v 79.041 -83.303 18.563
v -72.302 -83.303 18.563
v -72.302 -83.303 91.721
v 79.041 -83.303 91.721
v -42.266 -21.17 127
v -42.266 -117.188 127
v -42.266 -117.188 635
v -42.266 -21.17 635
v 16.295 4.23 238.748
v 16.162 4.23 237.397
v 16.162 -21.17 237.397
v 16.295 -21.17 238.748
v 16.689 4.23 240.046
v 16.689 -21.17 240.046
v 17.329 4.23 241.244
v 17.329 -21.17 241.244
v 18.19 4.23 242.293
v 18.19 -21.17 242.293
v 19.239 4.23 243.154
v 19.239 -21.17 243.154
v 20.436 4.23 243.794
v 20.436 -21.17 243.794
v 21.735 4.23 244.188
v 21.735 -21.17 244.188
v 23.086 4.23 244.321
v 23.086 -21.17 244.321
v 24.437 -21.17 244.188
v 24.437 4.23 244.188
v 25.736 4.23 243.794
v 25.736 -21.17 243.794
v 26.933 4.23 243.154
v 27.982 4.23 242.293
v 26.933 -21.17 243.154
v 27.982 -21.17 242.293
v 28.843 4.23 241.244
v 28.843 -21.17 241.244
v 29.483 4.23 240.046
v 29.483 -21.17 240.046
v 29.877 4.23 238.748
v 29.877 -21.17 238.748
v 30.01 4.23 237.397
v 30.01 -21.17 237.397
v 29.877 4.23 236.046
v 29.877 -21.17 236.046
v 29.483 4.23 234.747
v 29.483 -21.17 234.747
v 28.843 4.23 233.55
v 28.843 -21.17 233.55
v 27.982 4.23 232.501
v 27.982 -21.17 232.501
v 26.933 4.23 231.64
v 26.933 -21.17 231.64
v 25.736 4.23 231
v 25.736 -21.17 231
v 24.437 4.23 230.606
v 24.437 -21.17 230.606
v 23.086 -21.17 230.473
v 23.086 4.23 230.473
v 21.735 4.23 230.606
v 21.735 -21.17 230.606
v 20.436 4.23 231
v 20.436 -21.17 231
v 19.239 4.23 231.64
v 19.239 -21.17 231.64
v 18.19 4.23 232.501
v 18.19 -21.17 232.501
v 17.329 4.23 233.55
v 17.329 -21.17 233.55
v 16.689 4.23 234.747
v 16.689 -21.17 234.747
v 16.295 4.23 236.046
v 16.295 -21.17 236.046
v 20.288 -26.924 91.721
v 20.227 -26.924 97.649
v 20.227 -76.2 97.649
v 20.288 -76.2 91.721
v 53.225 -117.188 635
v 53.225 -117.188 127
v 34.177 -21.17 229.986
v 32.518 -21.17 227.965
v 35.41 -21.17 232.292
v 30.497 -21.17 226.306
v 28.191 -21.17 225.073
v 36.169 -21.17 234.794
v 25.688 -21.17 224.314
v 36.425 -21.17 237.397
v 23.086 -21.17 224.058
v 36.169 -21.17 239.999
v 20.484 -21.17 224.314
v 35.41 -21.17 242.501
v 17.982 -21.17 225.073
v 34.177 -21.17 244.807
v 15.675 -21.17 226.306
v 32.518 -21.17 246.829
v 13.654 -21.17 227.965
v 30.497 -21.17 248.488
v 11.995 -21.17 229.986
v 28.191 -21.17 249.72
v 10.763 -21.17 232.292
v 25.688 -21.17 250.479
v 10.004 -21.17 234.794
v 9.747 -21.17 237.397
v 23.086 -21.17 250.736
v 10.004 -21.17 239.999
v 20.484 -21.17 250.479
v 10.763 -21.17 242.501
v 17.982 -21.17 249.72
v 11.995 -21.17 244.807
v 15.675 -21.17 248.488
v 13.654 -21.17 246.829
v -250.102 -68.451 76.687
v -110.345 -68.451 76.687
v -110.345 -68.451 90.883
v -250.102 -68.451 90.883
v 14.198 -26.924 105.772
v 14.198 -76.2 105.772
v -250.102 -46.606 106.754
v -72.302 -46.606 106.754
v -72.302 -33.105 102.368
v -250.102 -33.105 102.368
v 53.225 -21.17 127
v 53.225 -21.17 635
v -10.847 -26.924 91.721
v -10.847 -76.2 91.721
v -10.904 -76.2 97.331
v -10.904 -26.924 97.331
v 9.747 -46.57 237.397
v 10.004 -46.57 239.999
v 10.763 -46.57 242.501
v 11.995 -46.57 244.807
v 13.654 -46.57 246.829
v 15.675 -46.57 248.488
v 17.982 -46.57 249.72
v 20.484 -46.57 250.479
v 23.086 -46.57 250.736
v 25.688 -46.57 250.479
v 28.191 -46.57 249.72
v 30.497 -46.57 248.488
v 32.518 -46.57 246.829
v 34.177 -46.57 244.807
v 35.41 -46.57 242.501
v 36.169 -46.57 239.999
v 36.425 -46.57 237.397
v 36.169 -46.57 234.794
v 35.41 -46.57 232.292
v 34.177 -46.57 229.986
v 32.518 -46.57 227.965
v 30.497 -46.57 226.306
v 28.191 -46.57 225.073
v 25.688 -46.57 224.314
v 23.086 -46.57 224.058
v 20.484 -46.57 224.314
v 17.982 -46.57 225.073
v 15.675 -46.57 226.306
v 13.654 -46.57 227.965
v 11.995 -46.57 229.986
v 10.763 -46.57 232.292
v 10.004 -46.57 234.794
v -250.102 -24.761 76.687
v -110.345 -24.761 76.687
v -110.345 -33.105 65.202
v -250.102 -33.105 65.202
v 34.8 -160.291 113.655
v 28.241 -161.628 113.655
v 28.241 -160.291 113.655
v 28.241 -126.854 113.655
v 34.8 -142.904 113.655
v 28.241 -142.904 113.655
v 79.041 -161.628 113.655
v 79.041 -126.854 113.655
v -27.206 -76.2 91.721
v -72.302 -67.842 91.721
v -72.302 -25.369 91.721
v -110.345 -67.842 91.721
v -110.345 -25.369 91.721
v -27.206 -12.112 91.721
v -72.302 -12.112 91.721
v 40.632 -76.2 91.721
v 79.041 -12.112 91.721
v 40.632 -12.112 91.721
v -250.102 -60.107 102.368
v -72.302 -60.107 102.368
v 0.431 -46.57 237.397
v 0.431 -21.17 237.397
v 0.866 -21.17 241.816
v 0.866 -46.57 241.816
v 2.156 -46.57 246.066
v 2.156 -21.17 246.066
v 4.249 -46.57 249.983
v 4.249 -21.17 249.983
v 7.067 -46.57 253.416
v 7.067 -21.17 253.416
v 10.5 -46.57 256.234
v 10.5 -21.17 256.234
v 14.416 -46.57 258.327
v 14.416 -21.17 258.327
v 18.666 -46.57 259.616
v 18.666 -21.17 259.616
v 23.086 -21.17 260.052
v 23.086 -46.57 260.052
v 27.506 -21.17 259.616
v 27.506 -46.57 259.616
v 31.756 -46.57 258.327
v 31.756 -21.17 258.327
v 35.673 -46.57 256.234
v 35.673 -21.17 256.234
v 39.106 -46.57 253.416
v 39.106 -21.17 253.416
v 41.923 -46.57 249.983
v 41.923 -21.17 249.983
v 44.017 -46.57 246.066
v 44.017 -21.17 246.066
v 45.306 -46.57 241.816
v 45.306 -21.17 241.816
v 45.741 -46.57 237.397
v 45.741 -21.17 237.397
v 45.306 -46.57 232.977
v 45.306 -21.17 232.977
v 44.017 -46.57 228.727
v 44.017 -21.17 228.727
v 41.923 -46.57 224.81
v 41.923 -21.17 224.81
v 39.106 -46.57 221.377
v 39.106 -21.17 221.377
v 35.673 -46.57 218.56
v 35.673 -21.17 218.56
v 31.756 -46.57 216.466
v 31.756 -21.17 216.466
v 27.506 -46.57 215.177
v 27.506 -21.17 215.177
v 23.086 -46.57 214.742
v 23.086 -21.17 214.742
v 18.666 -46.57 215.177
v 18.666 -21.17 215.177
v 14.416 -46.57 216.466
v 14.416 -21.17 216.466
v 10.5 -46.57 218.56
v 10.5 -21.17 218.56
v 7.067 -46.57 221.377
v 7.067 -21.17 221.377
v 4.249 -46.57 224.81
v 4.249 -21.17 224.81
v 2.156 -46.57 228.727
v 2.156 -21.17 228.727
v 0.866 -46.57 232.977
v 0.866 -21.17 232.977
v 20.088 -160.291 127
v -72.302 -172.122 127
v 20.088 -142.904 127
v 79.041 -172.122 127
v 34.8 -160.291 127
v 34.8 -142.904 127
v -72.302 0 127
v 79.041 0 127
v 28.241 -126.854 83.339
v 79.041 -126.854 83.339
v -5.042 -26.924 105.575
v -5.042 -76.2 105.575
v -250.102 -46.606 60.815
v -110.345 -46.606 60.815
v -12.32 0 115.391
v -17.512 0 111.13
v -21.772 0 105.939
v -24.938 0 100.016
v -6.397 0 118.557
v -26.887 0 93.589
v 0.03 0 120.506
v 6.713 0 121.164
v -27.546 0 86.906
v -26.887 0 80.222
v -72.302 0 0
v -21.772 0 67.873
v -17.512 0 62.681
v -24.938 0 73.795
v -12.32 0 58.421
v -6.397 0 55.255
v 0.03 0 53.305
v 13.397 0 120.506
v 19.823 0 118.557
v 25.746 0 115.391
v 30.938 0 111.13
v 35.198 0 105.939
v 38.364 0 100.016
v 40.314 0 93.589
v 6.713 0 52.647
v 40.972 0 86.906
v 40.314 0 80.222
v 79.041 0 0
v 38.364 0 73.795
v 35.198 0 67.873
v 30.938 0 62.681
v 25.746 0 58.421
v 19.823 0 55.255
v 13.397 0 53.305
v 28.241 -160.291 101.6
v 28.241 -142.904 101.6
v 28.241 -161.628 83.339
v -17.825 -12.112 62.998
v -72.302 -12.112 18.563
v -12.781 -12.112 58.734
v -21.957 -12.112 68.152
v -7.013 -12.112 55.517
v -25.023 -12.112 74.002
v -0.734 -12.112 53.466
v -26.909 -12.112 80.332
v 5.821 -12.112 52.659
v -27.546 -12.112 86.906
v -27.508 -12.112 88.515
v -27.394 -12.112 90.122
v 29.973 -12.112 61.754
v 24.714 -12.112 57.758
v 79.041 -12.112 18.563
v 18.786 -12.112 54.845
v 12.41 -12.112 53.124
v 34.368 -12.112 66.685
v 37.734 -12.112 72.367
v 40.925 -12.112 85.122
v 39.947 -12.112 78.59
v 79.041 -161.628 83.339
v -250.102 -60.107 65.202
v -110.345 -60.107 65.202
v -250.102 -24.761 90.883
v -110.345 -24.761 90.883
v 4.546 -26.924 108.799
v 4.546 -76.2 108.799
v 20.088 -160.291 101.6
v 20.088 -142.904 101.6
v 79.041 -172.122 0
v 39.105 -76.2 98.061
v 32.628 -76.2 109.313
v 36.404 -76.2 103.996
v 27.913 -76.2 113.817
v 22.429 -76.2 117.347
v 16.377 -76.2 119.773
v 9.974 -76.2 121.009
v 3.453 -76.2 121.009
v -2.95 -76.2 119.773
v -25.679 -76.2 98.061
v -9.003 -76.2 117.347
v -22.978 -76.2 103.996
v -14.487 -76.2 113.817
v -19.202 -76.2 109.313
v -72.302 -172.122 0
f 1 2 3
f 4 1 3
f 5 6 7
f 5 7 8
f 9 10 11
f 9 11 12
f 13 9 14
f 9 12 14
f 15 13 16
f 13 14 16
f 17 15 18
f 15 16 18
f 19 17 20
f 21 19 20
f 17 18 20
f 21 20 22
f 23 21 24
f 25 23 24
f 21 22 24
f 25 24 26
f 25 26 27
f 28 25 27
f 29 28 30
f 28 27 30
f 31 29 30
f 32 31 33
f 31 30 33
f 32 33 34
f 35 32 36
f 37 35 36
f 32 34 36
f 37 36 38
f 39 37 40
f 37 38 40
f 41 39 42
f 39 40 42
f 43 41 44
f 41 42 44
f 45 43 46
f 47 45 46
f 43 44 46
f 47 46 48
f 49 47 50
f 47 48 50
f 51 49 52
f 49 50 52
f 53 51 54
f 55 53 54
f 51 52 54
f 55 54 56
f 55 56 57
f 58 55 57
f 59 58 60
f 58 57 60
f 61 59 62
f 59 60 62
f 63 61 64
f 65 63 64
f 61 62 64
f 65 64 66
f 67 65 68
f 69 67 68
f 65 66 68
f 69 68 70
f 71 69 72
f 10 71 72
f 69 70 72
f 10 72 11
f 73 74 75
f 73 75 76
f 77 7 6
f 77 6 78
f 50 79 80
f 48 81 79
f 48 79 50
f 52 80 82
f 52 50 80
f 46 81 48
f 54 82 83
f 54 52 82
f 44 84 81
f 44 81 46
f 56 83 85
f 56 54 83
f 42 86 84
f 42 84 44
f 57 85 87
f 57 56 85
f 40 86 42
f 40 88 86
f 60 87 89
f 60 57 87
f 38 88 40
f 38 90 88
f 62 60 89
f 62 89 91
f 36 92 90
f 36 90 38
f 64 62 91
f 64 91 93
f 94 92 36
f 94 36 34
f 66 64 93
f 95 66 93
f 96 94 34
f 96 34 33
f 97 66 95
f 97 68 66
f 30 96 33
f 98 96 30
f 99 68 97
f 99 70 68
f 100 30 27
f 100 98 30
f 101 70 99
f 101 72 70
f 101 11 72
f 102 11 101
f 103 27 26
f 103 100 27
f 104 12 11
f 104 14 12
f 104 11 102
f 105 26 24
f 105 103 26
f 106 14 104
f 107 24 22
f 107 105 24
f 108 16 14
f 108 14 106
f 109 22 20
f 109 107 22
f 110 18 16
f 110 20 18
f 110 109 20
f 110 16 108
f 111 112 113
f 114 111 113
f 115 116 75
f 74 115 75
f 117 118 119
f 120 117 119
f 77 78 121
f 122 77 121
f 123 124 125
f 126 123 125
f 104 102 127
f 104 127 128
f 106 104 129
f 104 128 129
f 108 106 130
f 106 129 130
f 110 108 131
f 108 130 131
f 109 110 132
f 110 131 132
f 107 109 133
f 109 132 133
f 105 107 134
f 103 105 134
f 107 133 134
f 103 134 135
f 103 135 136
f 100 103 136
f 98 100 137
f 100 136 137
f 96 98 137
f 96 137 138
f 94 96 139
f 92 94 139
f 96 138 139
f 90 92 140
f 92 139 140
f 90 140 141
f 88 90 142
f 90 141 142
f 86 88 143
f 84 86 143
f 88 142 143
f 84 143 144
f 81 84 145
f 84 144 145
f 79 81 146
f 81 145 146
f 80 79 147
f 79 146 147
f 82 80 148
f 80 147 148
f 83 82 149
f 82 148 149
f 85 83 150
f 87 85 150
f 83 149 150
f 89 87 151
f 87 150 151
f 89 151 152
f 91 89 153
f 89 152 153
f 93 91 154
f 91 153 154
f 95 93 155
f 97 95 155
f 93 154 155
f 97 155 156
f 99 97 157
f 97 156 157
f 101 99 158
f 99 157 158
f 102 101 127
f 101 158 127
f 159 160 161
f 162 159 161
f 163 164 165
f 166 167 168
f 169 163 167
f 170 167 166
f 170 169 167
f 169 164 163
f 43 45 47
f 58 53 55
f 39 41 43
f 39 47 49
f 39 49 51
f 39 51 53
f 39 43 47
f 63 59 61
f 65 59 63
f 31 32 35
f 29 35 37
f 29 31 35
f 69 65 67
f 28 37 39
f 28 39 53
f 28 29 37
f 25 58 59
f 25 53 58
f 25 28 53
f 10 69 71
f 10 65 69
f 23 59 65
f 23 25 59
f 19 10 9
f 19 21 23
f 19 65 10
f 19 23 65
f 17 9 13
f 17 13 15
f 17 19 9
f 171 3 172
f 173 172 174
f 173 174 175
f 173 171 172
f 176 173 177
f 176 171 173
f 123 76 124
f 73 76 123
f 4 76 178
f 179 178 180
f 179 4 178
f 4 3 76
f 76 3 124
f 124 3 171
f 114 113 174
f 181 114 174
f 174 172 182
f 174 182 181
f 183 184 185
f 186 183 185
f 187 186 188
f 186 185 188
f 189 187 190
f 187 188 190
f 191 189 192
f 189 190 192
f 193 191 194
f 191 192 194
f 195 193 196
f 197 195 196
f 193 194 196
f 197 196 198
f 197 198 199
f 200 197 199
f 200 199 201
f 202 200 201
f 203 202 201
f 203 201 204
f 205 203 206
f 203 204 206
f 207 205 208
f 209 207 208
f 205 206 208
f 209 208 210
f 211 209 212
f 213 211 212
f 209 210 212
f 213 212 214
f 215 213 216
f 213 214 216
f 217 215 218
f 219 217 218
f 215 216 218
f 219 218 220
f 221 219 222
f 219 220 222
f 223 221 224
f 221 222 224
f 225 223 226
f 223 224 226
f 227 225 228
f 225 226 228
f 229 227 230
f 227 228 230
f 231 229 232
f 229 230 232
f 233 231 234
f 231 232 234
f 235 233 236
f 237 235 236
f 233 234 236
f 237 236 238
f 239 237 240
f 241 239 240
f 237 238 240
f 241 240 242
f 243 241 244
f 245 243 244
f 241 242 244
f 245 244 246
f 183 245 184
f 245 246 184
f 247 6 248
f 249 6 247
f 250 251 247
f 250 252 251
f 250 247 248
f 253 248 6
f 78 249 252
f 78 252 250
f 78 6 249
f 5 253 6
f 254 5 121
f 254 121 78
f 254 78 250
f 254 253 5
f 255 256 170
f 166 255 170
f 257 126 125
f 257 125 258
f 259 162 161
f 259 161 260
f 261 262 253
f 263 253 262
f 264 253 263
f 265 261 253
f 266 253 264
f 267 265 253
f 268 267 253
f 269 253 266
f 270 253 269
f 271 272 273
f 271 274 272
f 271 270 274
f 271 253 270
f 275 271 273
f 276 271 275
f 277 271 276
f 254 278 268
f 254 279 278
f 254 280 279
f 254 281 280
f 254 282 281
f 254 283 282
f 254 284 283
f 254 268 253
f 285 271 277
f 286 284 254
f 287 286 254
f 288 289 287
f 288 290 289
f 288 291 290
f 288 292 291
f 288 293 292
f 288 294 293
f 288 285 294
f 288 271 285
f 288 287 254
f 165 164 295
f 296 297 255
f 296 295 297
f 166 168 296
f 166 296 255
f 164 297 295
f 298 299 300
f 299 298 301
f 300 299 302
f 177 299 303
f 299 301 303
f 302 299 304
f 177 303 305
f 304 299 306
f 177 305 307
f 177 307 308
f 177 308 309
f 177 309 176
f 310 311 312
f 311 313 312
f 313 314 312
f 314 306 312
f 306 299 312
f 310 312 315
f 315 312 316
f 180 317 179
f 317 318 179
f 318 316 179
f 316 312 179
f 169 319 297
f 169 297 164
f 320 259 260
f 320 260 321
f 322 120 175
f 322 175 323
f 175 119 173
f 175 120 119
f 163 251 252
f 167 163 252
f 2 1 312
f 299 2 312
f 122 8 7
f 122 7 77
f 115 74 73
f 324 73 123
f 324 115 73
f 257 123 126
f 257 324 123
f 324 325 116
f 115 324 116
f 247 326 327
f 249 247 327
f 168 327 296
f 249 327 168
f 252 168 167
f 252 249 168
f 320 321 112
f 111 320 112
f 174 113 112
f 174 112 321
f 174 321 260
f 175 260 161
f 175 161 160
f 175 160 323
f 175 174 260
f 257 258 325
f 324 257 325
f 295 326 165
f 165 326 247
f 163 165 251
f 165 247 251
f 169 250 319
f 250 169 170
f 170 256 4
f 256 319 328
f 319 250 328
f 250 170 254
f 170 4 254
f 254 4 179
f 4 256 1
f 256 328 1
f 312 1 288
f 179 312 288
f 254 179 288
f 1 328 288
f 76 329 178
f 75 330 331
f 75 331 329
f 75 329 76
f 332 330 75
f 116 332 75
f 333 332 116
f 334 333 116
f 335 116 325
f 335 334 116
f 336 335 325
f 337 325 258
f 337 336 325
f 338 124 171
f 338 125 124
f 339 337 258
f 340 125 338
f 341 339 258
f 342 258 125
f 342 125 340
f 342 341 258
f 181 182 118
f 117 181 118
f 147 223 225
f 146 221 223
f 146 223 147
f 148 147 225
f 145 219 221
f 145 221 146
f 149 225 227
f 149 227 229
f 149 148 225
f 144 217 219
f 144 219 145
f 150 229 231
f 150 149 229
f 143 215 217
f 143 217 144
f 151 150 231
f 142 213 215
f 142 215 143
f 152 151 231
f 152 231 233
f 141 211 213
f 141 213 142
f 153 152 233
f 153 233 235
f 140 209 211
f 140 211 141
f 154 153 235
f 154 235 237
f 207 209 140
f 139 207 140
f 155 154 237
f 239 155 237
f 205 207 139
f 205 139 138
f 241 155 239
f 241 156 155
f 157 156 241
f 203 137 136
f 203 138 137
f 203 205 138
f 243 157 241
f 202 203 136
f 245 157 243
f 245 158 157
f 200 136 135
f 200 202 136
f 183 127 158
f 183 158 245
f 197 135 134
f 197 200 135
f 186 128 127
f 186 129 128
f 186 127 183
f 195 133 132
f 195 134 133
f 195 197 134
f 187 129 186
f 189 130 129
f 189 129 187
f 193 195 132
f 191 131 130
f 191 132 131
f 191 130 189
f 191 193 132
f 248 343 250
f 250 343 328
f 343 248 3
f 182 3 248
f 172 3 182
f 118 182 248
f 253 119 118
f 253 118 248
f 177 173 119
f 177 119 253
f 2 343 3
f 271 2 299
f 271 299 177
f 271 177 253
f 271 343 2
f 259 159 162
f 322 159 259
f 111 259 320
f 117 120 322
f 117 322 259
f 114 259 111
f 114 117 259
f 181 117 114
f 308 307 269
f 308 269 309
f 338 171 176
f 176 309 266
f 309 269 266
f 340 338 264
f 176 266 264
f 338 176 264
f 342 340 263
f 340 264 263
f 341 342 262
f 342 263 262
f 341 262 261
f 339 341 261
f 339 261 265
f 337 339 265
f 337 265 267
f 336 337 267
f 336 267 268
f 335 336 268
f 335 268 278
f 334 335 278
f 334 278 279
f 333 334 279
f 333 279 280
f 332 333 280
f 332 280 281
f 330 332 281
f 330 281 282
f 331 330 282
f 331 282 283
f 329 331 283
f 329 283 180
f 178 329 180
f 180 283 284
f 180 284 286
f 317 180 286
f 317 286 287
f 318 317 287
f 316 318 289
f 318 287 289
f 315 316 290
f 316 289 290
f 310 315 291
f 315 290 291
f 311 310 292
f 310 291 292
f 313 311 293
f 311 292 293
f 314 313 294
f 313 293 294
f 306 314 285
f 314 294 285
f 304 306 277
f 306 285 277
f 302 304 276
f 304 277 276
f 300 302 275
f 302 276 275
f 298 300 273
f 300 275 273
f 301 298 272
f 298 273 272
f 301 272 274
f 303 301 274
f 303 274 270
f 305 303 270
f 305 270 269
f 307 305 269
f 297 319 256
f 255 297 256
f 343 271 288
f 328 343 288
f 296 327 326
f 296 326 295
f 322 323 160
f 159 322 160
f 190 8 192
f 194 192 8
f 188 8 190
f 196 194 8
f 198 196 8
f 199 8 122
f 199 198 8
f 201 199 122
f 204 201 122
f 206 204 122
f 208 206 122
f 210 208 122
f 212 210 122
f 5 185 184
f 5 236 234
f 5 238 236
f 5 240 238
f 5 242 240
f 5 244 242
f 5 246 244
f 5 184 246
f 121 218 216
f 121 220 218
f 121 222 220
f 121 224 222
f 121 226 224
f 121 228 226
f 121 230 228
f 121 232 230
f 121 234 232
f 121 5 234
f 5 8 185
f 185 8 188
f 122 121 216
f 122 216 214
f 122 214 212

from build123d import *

# Parameters (mm, degrees)
F0_W      = 151.3425782323
F0_H      = 172.1224486828
F1_DEPTH  = 127
F3_W      = 34.7741246223
F3_H      = 30.3159058094
F4_DEPTH  = 50.8
F5_W      = 14.7121287882
F5_H      = 17.3870623112
F6_DEPTH  = 25.4
F7_R      = 34.2587493425
F8_DEPTH  = 76.2
F10_DEPTH = 177.8
F13_DEPTH = 49.276
F14_W     = 71.1912401021
F14_H     = 73.1580201536
F15_DEPTH = 189.385448
F16_W     = 95.4910255969
F16_H     = 96.0185993463
F17_DEPTH = 508
F18_R     = 22.6550220724
F19_DEPTH = 25.4
F20_R     = 12.5097530491
F21_DEPTH = 25.4
F22_R     = 13.338874827
F23_DEPTH = 25.4
F24_R     = 6.9241134555
F25_DEPTH = 25.4


with BuildPart() as f1:
    # F0 (on Top) → F1 (new body)
    with BuildSketch(Plane.XY):
        with Locations((3.3693946898, -86.0612243414)):
            Rectangle(F0_W, F0_H)
    extrude(amount=F1_DEPTH)

    # F3 (on face) → F4 (cut)
    with BuildSketch(Plane.YZ.offset(79.0406838059)):
        with Locations((-144.2410051823, 98.4970331192)):
            Rectangle(F3_W, F3_H)
    extrude(amount=-F4_DEPTH, mode=Mode.SUBTRACT)

    # F5 (on face) → F6 (cut)
    with BuildSketch(Plane.XY.offset(127)):
        with Locations((27.4437833577, -151.5970826149)):
            Rectangle(F5_W, F5_H)
    extrude(amount=-F6_DEPTH, mode=Mode.SUBTRACT)

    # F7 (on face) → F8 (cut)
    with BuildSketch(Plane(origin=(0, 0, 0), x_dir=(-1, 0, 0), z_dir=(0, 1, 0))):
        with Locations((-6.7130560055, 86.9056582451)):
            Circle(F7_R)
    extrude(amount=-F8_DEPTH, mode=Mode.SUBTRACT)

    # F9 (on face) → F10 (join)
    with BuildSketch(Plane(origin=(-72.3018944263, 0, 0), x_dir=(0, -1, 0), z_dir=(-1, 0, 0))):
        Polygon((68.4512555599, 76.6869447389), (68.4512555599, 90.8828713736), (60.1070992414, 102.3676172721), (46.6059707105, 106.7543998531), (33.1048421797, 102.3676172721), (24.7606858611, 90.8828713736), (24.7606858611, 76.6869447389), (33.1048421797, 65.2021988404), (46.6059707105, 60.8154162594), (60.1070992414, 65.2021988404), align=None)
    extrude(amount=F10_DEPTH)

    # F12 (on face) → F13 (join)
    with BuildSketch(Plane(origin=(0, -76.2, 0), x_dir=(-1, 0, 0), z_dir=(0, 1, 0))):
        Polygon((4.7714961833, 79.0930910356), (10.800817036, 87.215729212), (10.9042731407, 97.3310274144), (5.0423477816, 105.5752855359), (-4.5459027936, 108.7994771861), (-14.1980927578, 105.7720707409), (-20.2274136105, 97.6494325645), (-20.3308697152, 87.5341343621), (-14.4689443561, 79.2898762406), (-4.8806937809, 76.0656845904), align=None)
    extrude(amount=F13_DEPTH)

    # F14 (on face) → F15 (cut)
    with BuildSketch(Plane.YZ.offset(79.0406838059)):
        with Locations((-47.7073919028, 55.1417870447)):
            Rectangle(F14_W, F14_H)
    extrude(amount=-F15_DEPTH, mode=Mode.SUBTRACT)

    # F16 (on face) → F17 (join)
    with BuildSketch(Plane.XY.offset(127)):
        with Locations((5.4796915501, -69.1788261756)):
            Rectangle(F16_W, F16_H)
    extrude(amount=F17_DEPTH)

    # F18 (on face) → F19 (cut)
    with BuildSketch(Plane(origin=(0, -21.1695265025, 0), x_dir=(-1, 0, 0), z_dir=(0, 1, 0))):
        with Locations((-23.0861343443, 237.3967021704)):
            Circle(F18_R)
    extrude(amount=-F19_DEPTH, mode=Mode.SUBTRACT)

    # F20 (on face) → F21 (join)
    with BuildSketch(Plane(origin=(0, -46.5695265025, 0), x_dir=(-1, 0, 0), z_dir=(0, 1, 0))):
        with Locations((-23.0861343443, 237.3967021704)):
            Circle(F20_R)
    extrude(amount=-F21_DEPTH)

    # F22 (on face) → F23 (join)
    with BuildSketch(Plane(origin=(0, -46.5695265025, 0), x_dir=(-1, 0, 0), z_dir=(0, 1, 0))):
        with Locations((-23.0861343443, 237.3967021704)):
            Circle(F22_R)
    extrude(amount=F23_DEPTH)

    # F24 (on face) → F25 (join)
    with BuildSketch(Plane(origin=(0, -21.1695265025, 0), x_dir=(-1, 0, 0), z_dir=(0, 1, 0))):
        with Locations((-23.0861343443, 237.3967021704)):
            Circle(F24_R)
    extrude(amount=F25_DEPTH)


solid = f1.part
